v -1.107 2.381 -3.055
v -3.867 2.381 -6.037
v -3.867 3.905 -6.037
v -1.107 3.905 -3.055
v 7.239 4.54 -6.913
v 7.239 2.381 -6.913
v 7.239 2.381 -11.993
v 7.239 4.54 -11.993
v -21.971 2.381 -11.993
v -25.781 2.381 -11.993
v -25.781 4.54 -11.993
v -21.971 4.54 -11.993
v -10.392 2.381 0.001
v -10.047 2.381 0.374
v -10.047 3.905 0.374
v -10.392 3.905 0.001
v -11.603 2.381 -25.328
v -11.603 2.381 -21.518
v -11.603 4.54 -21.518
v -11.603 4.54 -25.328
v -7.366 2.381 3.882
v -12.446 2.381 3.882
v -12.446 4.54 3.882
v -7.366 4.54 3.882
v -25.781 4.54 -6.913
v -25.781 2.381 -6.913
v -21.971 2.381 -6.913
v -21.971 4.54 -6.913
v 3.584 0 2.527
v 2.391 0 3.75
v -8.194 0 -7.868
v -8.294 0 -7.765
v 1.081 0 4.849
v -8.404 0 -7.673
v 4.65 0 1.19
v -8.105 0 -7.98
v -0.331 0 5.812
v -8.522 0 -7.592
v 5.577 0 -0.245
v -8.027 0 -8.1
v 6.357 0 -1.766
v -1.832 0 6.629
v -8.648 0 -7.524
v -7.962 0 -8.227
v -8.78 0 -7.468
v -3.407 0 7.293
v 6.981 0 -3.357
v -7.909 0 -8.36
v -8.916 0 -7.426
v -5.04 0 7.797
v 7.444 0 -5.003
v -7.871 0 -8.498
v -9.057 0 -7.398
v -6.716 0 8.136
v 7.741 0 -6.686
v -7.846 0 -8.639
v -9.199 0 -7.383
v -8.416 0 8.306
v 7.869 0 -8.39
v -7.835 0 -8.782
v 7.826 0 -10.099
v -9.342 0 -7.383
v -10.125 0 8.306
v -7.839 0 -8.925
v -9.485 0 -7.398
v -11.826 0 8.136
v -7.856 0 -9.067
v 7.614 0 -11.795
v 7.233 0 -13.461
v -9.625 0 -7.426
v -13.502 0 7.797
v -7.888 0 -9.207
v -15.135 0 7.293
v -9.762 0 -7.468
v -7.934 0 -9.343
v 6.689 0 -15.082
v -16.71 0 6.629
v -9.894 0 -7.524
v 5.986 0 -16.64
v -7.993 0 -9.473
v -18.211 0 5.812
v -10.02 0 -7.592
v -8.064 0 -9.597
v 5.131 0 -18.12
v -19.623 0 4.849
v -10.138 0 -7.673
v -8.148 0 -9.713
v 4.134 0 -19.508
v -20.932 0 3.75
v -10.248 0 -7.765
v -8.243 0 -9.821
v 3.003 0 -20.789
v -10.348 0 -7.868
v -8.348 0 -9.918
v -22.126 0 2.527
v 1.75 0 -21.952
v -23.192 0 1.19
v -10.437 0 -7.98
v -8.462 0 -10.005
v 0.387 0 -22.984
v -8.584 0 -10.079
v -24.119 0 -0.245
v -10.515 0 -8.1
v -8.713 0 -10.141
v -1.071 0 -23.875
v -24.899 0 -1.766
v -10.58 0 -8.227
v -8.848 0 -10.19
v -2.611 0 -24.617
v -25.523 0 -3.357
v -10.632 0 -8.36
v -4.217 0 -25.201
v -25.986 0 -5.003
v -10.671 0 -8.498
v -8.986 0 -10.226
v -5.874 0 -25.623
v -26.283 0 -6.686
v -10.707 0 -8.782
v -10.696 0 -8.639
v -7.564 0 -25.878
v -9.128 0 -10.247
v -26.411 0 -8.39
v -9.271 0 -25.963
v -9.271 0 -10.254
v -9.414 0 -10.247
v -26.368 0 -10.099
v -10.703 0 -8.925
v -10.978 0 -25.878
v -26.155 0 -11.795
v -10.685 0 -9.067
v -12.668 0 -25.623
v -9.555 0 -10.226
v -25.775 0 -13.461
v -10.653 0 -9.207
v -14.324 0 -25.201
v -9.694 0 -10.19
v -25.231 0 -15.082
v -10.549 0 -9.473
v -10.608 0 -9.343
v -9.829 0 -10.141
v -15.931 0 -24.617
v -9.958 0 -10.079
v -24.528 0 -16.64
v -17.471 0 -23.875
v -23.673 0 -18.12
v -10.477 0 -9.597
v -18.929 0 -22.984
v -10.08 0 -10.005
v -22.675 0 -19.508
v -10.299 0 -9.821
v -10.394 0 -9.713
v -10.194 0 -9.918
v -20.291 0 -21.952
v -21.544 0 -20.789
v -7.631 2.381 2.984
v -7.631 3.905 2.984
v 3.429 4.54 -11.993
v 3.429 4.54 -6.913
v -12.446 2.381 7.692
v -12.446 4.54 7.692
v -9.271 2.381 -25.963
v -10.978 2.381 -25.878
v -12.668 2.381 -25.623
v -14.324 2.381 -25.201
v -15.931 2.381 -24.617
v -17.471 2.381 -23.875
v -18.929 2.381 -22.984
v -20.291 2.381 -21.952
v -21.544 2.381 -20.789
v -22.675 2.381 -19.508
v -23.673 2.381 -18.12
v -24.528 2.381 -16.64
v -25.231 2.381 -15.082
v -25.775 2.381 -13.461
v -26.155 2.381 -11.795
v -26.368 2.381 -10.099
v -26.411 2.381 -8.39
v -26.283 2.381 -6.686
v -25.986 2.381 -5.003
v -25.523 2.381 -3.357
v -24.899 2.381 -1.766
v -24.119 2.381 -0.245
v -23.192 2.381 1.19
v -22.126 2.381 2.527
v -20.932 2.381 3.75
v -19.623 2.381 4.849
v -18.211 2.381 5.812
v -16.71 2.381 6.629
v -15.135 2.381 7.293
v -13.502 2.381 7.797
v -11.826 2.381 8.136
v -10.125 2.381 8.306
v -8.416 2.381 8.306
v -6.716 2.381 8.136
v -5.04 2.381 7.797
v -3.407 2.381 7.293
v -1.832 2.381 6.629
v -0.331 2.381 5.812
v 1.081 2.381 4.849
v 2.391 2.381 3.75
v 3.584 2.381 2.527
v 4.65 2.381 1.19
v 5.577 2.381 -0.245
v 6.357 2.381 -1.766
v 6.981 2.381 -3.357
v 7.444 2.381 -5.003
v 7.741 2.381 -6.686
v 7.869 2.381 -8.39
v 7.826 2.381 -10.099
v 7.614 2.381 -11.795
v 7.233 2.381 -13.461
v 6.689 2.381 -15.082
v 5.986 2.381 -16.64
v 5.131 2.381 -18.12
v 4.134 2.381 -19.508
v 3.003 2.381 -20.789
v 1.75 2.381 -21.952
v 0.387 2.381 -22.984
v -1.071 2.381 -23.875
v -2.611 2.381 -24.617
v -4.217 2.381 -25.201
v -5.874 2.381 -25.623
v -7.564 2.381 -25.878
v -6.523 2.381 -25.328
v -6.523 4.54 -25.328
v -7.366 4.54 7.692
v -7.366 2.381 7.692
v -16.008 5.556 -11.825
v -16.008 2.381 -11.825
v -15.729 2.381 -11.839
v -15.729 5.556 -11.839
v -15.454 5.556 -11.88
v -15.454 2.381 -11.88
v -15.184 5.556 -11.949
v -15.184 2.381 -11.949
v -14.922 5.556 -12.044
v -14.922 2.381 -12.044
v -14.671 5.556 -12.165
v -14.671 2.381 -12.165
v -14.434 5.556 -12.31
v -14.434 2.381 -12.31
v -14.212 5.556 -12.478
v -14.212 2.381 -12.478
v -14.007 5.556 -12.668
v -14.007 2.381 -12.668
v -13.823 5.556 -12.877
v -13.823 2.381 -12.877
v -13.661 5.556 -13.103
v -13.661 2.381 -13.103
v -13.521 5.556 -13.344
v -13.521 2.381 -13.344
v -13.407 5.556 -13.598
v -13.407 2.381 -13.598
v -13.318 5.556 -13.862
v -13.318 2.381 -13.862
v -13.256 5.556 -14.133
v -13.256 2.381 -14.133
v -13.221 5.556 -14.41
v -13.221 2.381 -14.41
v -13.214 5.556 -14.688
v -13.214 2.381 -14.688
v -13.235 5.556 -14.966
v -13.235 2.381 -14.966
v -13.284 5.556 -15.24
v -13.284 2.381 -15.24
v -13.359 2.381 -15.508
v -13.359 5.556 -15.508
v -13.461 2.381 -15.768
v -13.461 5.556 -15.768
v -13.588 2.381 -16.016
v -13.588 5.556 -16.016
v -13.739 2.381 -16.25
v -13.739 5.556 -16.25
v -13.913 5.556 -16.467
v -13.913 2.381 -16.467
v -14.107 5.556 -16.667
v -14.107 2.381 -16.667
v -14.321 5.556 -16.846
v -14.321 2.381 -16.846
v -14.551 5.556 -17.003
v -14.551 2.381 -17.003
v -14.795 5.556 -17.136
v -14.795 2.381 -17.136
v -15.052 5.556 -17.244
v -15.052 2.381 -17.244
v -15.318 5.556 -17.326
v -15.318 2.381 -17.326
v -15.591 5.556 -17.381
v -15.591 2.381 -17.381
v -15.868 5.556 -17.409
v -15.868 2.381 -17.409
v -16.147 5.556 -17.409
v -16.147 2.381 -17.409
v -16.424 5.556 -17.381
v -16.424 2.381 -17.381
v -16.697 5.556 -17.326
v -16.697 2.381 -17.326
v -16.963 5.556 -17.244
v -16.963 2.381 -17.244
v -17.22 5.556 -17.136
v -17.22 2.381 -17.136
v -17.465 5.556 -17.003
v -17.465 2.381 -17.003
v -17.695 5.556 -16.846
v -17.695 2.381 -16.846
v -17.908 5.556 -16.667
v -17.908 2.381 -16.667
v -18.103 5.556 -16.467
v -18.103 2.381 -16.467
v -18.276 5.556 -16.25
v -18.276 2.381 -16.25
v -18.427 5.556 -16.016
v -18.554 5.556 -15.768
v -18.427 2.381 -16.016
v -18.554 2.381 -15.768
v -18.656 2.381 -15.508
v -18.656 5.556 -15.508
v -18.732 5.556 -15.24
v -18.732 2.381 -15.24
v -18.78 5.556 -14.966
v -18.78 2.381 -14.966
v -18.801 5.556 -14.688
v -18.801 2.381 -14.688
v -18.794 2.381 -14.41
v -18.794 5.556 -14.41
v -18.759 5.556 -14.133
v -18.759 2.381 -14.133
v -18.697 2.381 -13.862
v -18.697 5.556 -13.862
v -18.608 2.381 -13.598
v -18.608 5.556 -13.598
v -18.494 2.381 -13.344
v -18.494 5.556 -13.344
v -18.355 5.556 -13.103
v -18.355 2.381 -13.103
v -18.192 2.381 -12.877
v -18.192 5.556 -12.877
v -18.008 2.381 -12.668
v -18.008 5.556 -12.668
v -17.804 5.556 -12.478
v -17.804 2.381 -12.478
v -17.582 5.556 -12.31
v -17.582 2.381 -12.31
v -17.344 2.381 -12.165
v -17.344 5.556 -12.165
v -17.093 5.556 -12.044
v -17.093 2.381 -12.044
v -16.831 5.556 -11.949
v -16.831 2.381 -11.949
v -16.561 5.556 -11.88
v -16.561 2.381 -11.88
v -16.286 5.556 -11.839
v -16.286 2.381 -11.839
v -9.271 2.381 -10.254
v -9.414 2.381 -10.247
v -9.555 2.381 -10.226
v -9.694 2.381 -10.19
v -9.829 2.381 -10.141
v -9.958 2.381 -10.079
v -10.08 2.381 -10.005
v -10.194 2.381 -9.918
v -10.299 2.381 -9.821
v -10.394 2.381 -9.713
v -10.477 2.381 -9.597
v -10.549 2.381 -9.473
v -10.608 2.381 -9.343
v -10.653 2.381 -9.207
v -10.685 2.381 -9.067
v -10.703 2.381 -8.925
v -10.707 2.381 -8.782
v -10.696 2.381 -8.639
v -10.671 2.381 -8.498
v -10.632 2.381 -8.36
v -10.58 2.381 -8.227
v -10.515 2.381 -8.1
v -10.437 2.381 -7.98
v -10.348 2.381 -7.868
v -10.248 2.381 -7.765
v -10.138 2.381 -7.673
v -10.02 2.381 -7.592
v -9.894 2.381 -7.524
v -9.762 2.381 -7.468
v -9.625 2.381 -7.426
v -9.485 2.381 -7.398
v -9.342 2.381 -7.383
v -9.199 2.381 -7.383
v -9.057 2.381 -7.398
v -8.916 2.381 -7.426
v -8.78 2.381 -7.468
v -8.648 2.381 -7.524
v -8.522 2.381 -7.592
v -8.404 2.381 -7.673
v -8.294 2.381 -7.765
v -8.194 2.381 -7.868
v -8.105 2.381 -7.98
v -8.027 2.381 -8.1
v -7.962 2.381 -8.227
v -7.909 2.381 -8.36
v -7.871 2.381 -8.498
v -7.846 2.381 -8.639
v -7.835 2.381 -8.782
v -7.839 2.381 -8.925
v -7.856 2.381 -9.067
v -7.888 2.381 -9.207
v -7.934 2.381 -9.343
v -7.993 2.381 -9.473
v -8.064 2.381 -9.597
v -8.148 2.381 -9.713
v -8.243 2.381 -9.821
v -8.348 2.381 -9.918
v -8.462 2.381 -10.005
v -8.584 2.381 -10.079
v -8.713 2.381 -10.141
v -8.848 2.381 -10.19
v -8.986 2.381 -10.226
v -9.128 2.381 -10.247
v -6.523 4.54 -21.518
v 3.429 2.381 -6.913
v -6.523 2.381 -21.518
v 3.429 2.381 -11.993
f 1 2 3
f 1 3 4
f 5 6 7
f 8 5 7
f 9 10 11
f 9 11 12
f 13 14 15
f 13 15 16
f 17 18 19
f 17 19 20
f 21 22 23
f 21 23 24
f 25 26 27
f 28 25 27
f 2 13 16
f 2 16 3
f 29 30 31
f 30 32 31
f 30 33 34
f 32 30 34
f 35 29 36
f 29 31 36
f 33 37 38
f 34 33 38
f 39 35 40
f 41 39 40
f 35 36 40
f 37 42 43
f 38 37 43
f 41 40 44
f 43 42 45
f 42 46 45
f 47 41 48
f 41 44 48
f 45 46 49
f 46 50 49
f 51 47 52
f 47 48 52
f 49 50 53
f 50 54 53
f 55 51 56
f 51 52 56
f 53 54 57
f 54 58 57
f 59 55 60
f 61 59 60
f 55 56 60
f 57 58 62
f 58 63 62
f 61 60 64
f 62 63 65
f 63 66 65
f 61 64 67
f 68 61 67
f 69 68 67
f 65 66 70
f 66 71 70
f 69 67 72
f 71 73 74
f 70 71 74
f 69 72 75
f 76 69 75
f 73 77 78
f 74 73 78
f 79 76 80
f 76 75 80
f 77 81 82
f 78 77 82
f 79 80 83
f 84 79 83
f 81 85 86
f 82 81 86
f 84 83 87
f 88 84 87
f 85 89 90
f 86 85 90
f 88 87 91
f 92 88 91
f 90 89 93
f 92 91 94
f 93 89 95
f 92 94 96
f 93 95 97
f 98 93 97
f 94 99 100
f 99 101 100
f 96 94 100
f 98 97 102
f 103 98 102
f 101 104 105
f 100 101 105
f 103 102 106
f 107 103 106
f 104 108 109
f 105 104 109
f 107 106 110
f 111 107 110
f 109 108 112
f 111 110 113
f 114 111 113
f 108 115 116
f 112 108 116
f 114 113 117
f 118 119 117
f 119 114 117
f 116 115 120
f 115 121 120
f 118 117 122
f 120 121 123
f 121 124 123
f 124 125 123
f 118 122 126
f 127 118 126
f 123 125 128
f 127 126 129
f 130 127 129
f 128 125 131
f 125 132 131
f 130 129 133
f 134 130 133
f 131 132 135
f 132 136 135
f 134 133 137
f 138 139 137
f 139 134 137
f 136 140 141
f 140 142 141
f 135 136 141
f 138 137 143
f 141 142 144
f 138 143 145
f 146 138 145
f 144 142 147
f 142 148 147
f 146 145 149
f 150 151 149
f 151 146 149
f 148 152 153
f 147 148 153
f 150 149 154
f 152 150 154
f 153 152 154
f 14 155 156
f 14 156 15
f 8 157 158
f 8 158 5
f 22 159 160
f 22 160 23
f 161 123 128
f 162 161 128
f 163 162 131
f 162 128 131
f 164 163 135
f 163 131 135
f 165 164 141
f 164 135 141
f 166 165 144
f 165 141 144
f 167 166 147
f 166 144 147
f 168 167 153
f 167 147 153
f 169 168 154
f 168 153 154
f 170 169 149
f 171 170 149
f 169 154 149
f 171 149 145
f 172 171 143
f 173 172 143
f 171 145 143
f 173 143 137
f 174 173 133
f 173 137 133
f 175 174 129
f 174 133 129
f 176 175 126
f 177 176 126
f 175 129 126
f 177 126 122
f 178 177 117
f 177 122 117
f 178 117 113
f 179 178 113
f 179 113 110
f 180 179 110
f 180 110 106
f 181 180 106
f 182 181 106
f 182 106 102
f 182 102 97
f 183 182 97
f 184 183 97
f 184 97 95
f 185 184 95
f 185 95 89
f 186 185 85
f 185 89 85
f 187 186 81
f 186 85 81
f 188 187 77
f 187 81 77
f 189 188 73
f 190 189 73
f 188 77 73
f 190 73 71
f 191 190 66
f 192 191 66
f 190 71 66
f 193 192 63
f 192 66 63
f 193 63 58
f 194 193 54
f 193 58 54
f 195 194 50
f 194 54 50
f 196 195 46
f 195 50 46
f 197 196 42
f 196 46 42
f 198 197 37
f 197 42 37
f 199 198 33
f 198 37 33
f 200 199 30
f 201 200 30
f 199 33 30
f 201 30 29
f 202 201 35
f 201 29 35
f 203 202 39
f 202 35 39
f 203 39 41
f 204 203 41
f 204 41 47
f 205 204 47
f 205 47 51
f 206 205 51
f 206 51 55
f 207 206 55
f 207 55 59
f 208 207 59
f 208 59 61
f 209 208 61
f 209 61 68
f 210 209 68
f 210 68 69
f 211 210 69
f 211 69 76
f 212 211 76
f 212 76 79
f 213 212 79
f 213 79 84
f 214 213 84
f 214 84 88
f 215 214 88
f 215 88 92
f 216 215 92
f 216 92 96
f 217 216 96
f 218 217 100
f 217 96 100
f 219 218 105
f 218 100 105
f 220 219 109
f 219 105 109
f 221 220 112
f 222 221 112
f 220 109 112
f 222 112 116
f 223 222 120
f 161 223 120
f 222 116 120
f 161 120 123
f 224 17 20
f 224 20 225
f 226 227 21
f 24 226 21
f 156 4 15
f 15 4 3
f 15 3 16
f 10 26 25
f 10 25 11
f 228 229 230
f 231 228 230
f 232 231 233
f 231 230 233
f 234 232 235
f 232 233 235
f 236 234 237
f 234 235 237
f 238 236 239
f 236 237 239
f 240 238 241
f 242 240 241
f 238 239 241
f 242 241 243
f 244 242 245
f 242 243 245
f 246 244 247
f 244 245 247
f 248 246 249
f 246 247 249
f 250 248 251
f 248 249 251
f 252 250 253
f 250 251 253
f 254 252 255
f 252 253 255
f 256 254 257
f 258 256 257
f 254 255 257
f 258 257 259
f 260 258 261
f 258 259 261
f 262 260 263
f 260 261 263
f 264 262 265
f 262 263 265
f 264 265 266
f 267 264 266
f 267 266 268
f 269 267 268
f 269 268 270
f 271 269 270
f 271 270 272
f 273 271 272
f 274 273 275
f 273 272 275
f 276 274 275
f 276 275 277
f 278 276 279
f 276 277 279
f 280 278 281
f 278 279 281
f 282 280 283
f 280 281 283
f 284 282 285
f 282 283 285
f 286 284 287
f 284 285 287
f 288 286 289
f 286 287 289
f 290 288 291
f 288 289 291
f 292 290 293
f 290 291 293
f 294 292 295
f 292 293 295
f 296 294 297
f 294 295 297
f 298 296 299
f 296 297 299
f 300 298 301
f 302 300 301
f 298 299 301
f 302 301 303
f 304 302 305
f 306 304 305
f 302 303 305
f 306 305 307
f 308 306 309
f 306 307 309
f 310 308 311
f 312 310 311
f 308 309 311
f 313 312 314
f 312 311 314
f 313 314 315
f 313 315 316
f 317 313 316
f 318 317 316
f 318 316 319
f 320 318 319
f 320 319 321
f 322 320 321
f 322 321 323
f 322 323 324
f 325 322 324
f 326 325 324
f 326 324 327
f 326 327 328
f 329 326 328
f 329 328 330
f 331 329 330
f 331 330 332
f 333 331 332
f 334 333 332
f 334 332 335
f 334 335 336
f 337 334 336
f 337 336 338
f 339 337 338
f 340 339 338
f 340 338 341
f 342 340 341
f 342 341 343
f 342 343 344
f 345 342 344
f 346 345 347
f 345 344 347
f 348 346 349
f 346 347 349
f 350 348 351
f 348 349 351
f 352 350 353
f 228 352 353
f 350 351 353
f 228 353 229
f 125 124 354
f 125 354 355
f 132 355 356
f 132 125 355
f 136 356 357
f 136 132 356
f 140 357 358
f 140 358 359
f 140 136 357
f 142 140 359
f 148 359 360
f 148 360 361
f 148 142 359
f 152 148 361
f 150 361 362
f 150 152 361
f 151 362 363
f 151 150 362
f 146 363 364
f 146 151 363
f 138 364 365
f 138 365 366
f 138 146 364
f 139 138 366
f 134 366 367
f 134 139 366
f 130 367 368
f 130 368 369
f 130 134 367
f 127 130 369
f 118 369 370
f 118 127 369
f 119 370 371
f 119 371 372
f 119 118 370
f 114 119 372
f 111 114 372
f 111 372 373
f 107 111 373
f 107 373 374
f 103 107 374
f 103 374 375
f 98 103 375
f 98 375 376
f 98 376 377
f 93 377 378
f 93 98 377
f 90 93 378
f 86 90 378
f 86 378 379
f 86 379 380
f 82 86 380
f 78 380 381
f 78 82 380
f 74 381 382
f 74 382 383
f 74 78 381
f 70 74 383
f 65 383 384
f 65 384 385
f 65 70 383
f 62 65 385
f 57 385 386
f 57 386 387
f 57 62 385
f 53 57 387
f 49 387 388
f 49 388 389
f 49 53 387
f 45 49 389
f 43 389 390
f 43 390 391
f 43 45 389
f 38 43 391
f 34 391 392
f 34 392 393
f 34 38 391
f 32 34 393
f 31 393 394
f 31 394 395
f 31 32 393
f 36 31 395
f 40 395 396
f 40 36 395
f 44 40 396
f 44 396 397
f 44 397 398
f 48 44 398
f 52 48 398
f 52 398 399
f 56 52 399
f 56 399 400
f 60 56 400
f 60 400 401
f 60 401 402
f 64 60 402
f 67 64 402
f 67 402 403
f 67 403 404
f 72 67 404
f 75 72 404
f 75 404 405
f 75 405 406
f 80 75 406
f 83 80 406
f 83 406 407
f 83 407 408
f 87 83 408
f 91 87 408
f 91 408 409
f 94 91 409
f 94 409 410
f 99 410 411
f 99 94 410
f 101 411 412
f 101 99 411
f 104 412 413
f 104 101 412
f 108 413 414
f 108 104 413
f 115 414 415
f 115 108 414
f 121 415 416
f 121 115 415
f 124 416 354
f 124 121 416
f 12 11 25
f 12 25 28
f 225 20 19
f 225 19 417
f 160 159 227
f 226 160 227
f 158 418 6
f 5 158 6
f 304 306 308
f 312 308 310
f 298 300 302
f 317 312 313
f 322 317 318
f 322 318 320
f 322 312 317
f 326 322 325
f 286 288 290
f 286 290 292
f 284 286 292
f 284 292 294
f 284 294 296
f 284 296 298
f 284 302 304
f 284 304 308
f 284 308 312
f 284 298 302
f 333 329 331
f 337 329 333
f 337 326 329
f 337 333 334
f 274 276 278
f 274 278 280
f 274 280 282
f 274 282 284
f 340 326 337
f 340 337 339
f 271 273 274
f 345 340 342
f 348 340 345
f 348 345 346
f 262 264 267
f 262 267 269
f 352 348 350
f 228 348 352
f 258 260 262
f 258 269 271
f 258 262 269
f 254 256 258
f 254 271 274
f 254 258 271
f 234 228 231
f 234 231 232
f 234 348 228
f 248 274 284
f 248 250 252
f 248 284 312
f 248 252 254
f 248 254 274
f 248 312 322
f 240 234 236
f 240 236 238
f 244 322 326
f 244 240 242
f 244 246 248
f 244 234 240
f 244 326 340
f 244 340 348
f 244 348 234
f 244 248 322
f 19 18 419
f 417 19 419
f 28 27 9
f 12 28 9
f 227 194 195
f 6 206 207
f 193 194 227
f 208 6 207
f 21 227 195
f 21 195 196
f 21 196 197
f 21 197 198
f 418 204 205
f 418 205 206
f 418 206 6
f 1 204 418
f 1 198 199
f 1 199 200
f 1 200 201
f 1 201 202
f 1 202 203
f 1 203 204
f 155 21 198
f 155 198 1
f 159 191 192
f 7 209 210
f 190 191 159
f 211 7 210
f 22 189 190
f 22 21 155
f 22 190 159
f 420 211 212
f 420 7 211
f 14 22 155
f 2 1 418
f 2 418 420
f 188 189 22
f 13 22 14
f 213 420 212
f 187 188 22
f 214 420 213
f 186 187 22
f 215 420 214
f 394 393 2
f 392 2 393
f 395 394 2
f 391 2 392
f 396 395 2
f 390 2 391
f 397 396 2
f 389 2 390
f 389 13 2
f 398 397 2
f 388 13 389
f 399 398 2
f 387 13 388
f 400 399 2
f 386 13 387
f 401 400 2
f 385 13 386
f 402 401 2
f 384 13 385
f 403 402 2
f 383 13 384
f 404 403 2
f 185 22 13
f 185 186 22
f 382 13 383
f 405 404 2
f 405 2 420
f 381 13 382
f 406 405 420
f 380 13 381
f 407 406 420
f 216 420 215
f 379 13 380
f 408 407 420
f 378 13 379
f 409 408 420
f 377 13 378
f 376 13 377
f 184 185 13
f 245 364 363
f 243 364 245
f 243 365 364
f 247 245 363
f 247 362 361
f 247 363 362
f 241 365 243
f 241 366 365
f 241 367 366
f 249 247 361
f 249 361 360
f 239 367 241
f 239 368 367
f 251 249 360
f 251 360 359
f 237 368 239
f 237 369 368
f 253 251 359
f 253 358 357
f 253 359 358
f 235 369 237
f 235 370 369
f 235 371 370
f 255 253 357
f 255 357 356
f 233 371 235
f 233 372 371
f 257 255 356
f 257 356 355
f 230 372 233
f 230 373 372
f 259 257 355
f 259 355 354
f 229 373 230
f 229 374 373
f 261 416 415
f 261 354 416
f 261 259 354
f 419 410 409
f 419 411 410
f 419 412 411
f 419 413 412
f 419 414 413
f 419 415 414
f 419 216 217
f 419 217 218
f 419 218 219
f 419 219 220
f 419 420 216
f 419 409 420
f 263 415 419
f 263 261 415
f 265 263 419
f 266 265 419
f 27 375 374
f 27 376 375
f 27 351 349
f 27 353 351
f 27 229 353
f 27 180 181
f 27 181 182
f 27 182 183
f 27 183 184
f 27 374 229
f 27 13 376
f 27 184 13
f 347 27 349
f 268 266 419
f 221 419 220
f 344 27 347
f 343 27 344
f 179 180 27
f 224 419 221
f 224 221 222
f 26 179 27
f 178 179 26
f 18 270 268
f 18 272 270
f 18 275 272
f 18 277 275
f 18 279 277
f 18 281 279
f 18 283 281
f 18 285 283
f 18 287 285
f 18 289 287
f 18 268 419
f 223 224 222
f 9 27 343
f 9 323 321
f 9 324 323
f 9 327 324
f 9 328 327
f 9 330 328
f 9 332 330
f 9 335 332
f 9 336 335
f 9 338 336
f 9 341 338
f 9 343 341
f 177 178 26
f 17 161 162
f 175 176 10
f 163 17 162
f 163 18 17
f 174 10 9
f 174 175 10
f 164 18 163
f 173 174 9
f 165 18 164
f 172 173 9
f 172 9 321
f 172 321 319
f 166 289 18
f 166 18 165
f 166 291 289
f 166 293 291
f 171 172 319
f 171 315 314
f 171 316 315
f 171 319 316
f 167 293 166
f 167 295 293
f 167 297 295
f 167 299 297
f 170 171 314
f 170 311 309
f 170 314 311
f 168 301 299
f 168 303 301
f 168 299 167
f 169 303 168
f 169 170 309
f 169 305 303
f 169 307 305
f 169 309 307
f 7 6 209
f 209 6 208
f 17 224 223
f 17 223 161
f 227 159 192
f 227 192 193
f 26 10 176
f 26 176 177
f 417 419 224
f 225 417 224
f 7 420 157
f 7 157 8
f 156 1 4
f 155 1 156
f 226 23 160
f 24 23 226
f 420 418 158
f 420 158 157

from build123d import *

# Parameters (mm, degrees)
SKETCH1_R           = 17.145
SKETCH1_R_2         = 1.436229084
BOSS_EXTRUDE1_DEPTH = 2.38125
SKETCH3_R           = 2.794
BOSS_EXTRUDE2_DEPTH = 3.175
BOSS_EXTRUDE3_DEPTH = 1.524
SKETCH5_W           = 5.08
SKETCH5_H           = 3.81
SKETCH5_W_2         = 3.81
SKETCH5_H_2         = 5.08
BOSS_EXTRUDE4_DEPTH = 2.159


with BuildPart() as part:
    # Sketch1 → Boss-Extrude1 (new body)
    with BuildSketch(Plane(origin=(0, 0, 0), x_dir=(1, 0, 0), z_dir=(0, 1, 0))):
        with Locations(Location((-9.270876778, 8.817912865, 0), (0, 0, 90))):
            Circle(SKETCH1_R)
        with Locations(Location((-9.270876778, 8.817912865, 0), (0, 0, 90))):
            Circle(SKETCH1_R_2, mode=Mode.SUBTRACT)
    extrude(amount=BOSS_EXTRUDE1_DEPTH)

    # Sketch3 → Boss-Extrude2 (add)
    with BuildSketch(Plane(origin=(0, 2.38125, 0), x_dir=(1, 0, 0), z_dir=(0, 1, 0))):
        with Locations(Location((-16.007627964, 14.618626912, 0), (0, 0, 270))):
            Circle(SKETCH3_R)
    extrude(amount=BOSS_EXTRUDE2_DEPTH)

    # Sketch4 → Boss-Extrude3 (add)
    with BuildSketch(Plane(origin=(0, 2.38125, 0), x_dir=(1, 0, 0), z_dir=(0, 1, 0))):
        Polygon((-10.391608677, -0.001160783), (-3.867194412, 6.037391899), (-1.106713185, 3.054802521), (-7.63112745, -2.983750162), (-10.046548523, -0.373984456), align=None)
    extrude(amount=BOSS_EXTRUDE3_DEPTH)

    # Sketch5 → Boss-Extrude4 (add)
    with BuildSketch(Plane(origin=(0, 2.38125, 0), x_dir=(1, 0, 0), z_dir=(0, 1, 0))):
        with Locations((-9.905876778, -5.787087135)):
            Rectangle(SKETCH5_W, SKETCH5_H)
        with Locations((-9.062799481, 23.422912865)):
            Rectangle(SKETCH5_W, SKETCH5_H)
        with Locations((-23.875876778, 9.452912865)):
            Rectangle(SKETCH5_W_2, SKETCH5_H_2)
        with Locations((5.334123222, 9.452912865)):
            Rectangle(SKETCH5_W_2, SKETCH5_H_2)
    extrude(amount=BOSS_EXTRUDE4_DEPTH)


solid = part.part
